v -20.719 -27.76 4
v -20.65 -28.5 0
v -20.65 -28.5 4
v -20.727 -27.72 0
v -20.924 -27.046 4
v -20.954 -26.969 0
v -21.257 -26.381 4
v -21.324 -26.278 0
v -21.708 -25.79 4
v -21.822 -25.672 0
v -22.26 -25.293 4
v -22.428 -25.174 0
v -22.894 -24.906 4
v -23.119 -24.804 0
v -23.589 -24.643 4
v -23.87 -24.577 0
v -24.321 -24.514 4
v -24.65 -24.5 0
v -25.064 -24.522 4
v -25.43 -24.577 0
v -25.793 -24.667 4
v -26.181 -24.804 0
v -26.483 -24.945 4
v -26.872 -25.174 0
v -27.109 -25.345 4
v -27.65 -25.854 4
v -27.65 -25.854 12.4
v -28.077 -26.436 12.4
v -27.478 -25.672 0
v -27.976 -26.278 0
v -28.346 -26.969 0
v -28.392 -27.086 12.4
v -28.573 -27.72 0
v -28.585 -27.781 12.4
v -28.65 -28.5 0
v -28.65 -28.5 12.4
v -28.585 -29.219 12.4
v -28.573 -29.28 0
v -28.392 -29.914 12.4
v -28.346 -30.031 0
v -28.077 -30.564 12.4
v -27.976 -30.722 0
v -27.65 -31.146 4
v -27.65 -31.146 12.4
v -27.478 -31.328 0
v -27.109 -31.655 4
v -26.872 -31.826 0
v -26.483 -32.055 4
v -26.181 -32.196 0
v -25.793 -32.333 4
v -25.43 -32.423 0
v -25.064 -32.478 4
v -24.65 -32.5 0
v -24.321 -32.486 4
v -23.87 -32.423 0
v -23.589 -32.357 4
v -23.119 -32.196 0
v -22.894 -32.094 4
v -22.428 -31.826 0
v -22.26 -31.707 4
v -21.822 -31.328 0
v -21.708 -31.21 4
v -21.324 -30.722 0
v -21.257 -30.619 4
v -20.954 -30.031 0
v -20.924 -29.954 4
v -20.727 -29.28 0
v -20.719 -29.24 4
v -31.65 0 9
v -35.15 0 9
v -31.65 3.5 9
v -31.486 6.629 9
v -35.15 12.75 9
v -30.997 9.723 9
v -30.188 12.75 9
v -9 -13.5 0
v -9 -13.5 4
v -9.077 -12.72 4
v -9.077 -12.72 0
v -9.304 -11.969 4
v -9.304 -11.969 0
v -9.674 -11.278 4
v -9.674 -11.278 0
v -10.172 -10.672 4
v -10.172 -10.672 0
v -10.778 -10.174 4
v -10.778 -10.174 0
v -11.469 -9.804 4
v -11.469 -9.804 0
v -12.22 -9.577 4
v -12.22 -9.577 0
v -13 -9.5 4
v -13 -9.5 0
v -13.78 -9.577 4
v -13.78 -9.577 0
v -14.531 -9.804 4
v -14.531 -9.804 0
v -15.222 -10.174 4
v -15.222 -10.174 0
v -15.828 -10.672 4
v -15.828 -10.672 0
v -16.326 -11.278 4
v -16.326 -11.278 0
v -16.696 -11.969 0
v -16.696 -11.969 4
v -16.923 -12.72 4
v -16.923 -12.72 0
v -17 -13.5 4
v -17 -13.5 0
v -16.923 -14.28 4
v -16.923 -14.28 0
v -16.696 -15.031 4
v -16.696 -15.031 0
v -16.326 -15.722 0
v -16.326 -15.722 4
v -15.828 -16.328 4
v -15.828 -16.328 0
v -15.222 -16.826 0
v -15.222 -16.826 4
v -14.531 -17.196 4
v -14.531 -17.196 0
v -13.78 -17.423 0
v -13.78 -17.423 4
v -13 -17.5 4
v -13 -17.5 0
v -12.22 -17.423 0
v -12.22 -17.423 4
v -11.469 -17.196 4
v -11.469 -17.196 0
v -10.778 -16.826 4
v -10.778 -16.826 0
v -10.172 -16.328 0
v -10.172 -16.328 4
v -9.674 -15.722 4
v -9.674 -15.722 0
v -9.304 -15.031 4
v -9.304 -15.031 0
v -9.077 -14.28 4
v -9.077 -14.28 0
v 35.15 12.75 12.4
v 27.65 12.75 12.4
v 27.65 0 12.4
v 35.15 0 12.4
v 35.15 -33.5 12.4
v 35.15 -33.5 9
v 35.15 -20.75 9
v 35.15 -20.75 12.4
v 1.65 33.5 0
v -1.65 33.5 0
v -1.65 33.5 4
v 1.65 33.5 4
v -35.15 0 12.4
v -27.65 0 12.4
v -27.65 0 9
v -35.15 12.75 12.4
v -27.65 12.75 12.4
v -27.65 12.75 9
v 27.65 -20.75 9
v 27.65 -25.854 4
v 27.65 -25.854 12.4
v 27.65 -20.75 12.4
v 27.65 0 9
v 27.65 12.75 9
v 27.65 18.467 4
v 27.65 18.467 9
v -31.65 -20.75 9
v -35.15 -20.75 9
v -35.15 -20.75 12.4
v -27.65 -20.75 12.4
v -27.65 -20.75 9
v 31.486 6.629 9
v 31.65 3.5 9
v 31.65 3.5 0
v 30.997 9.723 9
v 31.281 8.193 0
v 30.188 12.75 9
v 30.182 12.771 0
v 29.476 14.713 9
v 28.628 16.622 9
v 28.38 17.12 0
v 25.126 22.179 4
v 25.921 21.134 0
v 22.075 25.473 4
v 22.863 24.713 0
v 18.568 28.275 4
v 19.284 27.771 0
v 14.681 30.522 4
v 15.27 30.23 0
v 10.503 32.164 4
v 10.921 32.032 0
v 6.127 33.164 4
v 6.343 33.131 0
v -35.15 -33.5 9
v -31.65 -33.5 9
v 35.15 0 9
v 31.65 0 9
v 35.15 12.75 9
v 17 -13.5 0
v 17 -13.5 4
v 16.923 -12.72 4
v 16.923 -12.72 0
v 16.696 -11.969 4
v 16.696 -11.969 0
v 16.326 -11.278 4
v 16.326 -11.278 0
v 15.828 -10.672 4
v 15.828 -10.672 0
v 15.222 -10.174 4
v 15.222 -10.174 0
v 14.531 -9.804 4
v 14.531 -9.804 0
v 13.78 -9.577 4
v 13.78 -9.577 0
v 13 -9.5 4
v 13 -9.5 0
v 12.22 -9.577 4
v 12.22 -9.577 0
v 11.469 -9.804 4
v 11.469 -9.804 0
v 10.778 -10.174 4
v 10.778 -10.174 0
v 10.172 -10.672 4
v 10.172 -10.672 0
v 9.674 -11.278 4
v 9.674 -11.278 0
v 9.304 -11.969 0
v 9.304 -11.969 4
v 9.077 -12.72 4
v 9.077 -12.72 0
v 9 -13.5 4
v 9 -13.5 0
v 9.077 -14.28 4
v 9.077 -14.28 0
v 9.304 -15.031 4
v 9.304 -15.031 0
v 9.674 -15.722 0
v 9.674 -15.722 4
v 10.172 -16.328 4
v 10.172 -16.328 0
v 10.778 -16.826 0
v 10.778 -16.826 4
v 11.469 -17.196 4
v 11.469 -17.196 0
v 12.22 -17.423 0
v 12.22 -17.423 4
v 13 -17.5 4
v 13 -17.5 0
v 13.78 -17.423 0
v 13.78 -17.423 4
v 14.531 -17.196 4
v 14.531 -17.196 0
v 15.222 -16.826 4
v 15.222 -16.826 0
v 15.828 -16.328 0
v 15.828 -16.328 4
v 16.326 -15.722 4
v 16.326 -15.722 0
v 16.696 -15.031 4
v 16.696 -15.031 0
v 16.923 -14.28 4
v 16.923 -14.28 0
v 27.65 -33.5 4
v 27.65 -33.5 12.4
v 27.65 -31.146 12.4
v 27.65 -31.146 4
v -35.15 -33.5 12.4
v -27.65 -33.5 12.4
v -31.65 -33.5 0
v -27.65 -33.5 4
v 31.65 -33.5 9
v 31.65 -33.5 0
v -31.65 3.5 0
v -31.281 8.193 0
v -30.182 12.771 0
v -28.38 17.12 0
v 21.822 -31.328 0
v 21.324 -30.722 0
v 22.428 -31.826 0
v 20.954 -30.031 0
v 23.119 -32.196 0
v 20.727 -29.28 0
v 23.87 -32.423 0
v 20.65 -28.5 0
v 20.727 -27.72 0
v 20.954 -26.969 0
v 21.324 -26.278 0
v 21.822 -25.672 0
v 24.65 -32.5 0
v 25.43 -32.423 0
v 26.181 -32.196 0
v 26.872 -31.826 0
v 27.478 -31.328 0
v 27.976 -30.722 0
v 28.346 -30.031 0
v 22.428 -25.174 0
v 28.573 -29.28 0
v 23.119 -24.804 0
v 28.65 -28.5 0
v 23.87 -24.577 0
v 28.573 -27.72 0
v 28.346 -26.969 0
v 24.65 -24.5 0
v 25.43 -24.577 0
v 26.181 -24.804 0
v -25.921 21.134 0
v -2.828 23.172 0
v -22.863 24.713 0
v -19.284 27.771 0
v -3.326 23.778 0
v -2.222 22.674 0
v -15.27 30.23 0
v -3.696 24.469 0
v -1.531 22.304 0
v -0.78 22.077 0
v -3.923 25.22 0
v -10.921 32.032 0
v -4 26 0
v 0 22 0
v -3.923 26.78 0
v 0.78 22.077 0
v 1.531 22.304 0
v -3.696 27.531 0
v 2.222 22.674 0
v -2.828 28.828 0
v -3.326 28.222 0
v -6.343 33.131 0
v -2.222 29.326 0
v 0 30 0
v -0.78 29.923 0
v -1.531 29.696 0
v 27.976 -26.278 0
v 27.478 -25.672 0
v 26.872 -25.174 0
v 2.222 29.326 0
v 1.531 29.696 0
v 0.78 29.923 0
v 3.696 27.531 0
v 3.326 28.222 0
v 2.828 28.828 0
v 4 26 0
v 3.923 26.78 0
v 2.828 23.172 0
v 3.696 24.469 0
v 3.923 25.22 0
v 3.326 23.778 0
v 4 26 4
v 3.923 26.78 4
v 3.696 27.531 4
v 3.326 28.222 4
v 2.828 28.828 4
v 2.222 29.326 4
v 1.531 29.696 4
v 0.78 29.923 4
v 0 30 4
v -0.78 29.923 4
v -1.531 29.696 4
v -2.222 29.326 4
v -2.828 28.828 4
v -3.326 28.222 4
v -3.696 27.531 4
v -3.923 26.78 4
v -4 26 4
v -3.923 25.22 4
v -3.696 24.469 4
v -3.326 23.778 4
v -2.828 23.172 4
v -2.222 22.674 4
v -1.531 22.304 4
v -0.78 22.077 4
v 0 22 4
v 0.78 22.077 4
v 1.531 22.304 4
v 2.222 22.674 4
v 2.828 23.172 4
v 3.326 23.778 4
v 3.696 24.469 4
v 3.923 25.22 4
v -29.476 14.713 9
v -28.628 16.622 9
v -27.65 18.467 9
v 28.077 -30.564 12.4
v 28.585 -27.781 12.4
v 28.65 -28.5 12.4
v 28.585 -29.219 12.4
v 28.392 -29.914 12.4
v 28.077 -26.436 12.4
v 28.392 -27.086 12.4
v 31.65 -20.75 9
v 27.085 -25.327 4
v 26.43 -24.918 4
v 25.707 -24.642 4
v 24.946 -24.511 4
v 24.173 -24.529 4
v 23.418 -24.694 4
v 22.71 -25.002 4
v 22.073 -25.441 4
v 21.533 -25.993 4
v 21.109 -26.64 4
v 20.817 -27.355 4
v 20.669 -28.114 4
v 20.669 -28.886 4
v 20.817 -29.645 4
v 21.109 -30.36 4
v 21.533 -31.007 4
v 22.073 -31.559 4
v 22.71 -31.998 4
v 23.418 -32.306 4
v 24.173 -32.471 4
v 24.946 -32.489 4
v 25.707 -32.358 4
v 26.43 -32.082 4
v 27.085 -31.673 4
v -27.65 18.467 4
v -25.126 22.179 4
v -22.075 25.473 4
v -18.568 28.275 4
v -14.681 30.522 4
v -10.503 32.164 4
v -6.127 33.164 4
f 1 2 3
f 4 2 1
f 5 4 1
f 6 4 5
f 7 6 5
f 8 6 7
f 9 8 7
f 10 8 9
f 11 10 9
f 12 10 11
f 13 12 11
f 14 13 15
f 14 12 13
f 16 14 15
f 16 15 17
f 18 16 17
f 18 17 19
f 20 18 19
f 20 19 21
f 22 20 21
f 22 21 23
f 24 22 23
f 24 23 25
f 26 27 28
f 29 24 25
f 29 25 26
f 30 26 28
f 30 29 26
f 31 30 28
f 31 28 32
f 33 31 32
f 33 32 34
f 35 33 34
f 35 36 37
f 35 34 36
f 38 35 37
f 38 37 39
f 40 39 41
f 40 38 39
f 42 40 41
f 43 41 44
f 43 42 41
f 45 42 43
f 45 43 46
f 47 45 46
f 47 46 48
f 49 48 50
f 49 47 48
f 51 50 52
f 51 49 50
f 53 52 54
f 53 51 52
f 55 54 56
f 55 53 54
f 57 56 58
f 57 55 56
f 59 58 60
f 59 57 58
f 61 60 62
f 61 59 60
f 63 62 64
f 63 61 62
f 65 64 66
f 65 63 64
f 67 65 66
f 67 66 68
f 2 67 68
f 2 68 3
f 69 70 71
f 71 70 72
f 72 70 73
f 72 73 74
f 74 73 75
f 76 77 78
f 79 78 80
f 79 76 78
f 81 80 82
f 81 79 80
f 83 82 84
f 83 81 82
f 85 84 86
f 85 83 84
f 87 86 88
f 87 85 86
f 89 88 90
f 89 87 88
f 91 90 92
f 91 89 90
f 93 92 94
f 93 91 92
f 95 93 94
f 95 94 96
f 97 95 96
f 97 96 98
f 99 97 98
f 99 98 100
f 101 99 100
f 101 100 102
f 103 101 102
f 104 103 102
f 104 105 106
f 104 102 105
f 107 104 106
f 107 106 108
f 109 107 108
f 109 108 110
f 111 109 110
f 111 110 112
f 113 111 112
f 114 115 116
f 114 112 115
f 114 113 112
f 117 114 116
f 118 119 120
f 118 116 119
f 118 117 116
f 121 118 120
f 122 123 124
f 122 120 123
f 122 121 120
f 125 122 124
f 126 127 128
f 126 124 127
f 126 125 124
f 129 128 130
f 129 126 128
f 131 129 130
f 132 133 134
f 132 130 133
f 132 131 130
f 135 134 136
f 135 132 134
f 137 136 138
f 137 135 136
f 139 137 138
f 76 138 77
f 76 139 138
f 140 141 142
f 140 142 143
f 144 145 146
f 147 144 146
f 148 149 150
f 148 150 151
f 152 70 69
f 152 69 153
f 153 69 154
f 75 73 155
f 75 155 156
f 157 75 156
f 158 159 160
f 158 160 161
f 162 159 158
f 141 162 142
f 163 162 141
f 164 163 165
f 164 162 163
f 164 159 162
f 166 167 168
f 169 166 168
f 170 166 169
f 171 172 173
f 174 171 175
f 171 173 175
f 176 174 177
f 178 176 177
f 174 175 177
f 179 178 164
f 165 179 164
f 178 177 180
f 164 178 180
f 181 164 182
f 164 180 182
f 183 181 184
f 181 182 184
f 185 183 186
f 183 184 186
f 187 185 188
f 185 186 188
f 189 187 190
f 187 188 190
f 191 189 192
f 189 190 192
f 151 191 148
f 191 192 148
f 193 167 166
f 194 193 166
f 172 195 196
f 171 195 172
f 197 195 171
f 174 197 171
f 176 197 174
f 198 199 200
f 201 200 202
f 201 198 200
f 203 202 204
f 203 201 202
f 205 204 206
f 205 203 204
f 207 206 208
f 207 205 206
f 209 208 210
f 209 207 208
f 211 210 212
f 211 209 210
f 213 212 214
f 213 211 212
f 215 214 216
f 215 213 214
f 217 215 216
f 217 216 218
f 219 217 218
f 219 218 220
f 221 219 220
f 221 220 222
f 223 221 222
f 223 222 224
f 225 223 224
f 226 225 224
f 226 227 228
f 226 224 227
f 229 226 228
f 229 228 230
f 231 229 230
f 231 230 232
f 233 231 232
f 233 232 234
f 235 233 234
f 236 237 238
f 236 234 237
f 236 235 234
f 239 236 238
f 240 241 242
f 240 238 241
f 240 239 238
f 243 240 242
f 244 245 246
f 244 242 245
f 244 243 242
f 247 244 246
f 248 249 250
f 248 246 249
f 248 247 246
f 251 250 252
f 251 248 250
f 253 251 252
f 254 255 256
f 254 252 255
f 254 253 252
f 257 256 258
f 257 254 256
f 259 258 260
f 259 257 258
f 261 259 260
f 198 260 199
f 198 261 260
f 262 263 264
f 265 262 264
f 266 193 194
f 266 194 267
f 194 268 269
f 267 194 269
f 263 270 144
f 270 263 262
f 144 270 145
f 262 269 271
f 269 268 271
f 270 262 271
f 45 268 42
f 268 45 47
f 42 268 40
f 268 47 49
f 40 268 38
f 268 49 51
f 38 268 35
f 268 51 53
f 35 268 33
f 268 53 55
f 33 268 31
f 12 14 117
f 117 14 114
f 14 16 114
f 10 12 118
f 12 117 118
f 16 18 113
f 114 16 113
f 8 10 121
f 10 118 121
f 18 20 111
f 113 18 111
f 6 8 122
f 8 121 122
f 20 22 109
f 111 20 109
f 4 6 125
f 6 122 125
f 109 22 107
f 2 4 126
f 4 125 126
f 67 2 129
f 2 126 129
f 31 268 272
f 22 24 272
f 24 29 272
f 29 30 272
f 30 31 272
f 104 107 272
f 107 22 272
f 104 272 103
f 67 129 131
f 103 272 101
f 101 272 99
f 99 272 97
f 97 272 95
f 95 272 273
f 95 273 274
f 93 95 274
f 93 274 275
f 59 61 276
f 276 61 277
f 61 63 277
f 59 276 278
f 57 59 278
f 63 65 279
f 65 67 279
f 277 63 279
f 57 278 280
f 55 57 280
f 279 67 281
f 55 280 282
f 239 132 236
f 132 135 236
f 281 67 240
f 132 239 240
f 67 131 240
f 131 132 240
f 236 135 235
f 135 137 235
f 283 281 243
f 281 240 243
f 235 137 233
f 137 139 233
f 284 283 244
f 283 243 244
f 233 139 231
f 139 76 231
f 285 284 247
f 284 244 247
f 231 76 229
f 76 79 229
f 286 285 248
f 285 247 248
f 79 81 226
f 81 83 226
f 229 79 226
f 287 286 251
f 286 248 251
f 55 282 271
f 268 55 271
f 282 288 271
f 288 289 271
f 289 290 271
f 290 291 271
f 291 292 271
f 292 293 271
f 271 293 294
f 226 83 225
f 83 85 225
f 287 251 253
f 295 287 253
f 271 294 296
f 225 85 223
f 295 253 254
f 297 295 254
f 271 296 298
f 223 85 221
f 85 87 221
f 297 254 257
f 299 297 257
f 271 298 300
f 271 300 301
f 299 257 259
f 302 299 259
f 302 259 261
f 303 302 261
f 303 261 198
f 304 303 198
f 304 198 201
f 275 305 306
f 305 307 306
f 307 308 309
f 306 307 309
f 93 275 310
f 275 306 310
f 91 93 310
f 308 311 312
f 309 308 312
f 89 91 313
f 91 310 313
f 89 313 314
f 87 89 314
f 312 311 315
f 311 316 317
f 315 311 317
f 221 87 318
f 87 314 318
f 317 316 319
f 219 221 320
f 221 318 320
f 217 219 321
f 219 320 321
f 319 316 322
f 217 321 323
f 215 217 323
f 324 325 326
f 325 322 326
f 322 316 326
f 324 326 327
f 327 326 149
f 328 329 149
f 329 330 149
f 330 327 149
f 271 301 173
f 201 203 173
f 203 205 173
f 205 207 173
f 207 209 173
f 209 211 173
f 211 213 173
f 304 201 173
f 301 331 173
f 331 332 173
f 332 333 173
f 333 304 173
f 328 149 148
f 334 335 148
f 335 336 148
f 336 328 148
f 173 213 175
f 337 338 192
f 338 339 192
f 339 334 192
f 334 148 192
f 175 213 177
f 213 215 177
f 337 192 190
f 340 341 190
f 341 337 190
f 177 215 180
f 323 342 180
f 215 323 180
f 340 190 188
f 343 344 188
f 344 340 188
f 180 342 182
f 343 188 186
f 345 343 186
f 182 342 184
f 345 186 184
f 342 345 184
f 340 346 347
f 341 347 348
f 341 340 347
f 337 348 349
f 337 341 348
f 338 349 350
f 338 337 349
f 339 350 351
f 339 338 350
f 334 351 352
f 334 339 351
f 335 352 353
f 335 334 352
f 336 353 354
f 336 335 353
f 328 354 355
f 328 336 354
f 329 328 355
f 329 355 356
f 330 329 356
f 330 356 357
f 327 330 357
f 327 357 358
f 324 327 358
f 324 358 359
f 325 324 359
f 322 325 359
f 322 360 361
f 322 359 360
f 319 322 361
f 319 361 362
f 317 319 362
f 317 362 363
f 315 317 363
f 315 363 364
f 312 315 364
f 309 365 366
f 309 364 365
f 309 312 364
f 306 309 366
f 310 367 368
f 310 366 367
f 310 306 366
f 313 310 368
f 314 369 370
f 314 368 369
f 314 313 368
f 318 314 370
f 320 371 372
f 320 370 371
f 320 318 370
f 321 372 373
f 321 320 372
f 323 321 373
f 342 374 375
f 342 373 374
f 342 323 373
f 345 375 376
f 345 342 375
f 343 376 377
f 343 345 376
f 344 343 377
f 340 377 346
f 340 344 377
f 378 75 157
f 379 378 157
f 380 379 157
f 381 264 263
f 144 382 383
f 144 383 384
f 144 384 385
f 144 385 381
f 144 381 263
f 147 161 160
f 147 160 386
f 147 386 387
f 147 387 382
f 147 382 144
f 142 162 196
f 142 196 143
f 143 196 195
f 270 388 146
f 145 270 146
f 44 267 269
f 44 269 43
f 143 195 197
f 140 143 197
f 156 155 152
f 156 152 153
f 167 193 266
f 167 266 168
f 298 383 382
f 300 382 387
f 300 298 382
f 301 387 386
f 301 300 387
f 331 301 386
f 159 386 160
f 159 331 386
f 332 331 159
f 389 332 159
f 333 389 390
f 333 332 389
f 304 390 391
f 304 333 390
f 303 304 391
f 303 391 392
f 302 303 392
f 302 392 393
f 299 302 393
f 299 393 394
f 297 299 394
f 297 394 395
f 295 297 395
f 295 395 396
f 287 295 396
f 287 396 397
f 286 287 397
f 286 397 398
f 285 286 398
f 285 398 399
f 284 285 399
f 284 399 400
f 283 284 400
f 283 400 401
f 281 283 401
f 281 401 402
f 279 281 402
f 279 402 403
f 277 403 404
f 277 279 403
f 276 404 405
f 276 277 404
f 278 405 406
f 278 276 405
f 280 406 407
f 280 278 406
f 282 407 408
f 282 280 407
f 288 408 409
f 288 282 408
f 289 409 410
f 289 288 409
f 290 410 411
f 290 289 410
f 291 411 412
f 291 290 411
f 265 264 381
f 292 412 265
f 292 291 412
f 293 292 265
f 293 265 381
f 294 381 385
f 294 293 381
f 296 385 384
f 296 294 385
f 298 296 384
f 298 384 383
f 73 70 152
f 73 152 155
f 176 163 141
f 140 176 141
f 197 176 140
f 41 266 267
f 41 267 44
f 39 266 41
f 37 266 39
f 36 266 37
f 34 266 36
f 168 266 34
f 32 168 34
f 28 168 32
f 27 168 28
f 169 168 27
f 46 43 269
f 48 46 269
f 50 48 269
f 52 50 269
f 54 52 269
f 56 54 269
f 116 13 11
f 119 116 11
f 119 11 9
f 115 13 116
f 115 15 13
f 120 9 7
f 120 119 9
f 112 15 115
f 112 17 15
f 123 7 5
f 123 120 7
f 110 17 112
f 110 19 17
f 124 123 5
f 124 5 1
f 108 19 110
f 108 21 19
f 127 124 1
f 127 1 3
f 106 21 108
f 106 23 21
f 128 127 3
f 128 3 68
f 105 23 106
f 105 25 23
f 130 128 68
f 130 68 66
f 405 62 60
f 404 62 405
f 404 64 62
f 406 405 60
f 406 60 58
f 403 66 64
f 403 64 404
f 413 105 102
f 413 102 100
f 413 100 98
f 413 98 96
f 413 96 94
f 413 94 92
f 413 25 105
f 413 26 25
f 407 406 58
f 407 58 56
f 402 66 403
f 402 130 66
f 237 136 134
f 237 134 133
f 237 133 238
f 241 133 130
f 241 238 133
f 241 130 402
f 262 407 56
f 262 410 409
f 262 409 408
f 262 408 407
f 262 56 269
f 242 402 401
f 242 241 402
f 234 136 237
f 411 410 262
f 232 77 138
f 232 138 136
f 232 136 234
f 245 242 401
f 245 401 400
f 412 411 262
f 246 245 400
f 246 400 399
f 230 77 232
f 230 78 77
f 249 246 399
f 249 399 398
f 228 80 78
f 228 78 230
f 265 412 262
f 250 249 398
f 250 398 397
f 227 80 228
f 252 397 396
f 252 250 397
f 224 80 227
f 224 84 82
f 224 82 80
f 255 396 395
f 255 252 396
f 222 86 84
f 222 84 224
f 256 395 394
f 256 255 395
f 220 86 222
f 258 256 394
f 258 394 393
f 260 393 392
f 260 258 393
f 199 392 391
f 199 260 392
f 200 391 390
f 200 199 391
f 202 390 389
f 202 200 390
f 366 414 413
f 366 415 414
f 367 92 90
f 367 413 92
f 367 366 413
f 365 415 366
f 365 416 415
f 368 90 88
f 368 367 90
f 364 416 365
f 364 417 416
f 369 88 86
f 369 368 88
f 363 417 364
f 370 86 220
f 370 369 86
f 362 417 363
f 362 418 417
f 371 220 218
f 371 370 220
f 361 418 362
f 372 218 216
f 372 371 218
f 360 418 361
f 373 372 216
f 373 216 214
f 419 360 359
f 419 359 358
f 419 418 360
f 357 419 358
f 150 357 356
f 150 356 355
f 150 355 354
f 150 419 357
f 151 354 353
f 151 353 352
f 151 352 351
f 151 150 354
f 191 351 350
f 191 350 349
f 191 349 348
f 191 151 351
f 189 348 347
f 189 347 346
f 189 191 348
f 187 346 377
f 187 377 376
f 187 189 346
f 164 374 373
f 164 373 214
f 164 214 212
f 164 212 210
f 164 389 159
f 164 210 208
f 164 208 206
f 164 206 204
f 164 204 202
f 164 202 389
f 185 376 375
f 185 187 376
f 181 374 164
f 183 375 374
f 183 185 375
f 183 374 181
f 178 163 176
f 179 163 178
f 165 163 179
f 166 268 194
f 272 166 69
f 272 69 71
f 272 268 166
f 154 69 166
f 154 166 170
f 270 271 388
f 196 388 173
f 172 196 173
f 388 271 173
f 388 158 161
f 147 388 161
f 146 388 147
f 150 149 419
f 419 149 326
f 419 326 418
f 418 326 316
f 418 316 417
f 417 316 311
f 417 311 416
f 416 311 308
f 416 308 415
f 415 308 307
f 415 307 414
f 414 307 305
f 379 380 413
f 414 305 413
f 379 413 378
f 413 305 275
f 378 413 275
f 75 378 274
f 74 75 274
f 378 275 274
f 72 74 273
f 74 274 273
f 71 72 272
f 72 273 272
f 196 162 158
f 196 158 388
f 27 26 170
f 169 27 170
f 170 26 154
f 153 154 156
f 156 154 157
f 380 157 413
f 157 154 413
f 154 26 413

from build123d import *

# Parameters (mm, degrees)
F0_W         = 63.3
F0_H         = 67
F1_DEPTH     = 4
F3_W         = 4
F3_H         = 67
F4_DEPTH     = 5
F6_W         = 7.5
F6_H         = 12.75
F7_DEPTH     = 3.4
F2_R         = 4
F9_DEPTH     = 25
F8_R         = 4
F10_DEPTH    = 25
F11_T1_DEPTH = 84
F12_T1_DEPTH = 84


# Not quite as in the source:
# - a fillet or chamfer that OpenCascade refuses, or shapes differently, is made with other operations: its cross-section is extruded or revolved along the edge and cut away or added


with BuildPart() as f1:
    # F0 (on Top) → F1 (new body)
    with BuildSketch(Plane.XY):
        Rectangle(F0_W, F0_H)
    extrude(amount=F1_DEPTH)

    # F3 (on face) → F4 (join)
    with BuildSketch(Plane.XY.offset(4)):
        with Locations((-29.65, 0)):
            Rectangle(F3_W, F3_H)
        with Locations((29.65, 0)):
            Rectangle(F3_W, F3_H)
    extrude(amount=F4_DEPTH)

    # F6 (on face) → F7 (join)
    with BuildSketch(Plane.XY.offset(9)):
        with Locations((-31.4, 6.375)):
            Rectangle(F6_W, F6_H)
        with Locations((-31.4, -27.125)):
            Rectangle(F6_W, F6_H)
        with Locations((31.4, -27.125)):
            Rectangle(F6_W, F6_H)
        with Locations((31.4, 6.375)):
            Rectangle(F6_W, F6_H)
    extrude(amount=F7_DEPTH)

    # F2 (on Top) → F9 (cut)
    with BuildSketch(Plane.XY):
        with Locations((-24.65, -28.5)):
            Circle(F2_R)
        with Locations((24.65, -28.5)):
            Circle(F2_R)
    extrude(amount=F9_DEPTH, mode=Mode.SUBTRACT)

    # F8 (on Top) → F10 (cut)
    with BuildSketch(Plane.XY):
        with Locations((0, 26)):
            Circle(F8_R)
        with Locations((-13, -13.5)):
            Circle(F8_R)
        with Locations((13, -13.5)):
            Circle(F8_R)
    extrude(amount=F10_DEPTH, mode=Mode.SUBTRACT)

    # F11: fillet of radius 30 on 1 edges, made by hand

    # F11_s2 → F11_t1 (cut)
    with BuildSketch(Plane.XY.offset(-75)):
        with BuildLine():
            ThreePointArc((-1.65, 33.5), (-22.8632034356, 24.7132034356), (-31.65, 3.5))
            Line((-31.65, 3.5), (-31.65, 33.5))
            Line((-31.65, 33.5), (-1.65, 33.5))
        make_face()
    extrude(amount=F11_T1_DEPTH, mode=Mode.SUBTRACT)

    # F12: fillet of radius 30 on 1 edges, made by hand

    # F12_s2 → F12_t1 (cut)
    with BuildSketch(Plane.XY.offset(-75)):
        with BuildLine():
            ThreePointArc((31.65, 3.5), (22.8632034356, 24.7132034356), (1.65, 33.5))
            Line((1.65, 33.5), (31.65, 33.5))
            Line((31.65, 33.5), (31.65, 3.5))
        make_face()
    extrude(amount=F12_T1_DEPTH, mode=Mode.SUBTRACT)


solid = f1.part
